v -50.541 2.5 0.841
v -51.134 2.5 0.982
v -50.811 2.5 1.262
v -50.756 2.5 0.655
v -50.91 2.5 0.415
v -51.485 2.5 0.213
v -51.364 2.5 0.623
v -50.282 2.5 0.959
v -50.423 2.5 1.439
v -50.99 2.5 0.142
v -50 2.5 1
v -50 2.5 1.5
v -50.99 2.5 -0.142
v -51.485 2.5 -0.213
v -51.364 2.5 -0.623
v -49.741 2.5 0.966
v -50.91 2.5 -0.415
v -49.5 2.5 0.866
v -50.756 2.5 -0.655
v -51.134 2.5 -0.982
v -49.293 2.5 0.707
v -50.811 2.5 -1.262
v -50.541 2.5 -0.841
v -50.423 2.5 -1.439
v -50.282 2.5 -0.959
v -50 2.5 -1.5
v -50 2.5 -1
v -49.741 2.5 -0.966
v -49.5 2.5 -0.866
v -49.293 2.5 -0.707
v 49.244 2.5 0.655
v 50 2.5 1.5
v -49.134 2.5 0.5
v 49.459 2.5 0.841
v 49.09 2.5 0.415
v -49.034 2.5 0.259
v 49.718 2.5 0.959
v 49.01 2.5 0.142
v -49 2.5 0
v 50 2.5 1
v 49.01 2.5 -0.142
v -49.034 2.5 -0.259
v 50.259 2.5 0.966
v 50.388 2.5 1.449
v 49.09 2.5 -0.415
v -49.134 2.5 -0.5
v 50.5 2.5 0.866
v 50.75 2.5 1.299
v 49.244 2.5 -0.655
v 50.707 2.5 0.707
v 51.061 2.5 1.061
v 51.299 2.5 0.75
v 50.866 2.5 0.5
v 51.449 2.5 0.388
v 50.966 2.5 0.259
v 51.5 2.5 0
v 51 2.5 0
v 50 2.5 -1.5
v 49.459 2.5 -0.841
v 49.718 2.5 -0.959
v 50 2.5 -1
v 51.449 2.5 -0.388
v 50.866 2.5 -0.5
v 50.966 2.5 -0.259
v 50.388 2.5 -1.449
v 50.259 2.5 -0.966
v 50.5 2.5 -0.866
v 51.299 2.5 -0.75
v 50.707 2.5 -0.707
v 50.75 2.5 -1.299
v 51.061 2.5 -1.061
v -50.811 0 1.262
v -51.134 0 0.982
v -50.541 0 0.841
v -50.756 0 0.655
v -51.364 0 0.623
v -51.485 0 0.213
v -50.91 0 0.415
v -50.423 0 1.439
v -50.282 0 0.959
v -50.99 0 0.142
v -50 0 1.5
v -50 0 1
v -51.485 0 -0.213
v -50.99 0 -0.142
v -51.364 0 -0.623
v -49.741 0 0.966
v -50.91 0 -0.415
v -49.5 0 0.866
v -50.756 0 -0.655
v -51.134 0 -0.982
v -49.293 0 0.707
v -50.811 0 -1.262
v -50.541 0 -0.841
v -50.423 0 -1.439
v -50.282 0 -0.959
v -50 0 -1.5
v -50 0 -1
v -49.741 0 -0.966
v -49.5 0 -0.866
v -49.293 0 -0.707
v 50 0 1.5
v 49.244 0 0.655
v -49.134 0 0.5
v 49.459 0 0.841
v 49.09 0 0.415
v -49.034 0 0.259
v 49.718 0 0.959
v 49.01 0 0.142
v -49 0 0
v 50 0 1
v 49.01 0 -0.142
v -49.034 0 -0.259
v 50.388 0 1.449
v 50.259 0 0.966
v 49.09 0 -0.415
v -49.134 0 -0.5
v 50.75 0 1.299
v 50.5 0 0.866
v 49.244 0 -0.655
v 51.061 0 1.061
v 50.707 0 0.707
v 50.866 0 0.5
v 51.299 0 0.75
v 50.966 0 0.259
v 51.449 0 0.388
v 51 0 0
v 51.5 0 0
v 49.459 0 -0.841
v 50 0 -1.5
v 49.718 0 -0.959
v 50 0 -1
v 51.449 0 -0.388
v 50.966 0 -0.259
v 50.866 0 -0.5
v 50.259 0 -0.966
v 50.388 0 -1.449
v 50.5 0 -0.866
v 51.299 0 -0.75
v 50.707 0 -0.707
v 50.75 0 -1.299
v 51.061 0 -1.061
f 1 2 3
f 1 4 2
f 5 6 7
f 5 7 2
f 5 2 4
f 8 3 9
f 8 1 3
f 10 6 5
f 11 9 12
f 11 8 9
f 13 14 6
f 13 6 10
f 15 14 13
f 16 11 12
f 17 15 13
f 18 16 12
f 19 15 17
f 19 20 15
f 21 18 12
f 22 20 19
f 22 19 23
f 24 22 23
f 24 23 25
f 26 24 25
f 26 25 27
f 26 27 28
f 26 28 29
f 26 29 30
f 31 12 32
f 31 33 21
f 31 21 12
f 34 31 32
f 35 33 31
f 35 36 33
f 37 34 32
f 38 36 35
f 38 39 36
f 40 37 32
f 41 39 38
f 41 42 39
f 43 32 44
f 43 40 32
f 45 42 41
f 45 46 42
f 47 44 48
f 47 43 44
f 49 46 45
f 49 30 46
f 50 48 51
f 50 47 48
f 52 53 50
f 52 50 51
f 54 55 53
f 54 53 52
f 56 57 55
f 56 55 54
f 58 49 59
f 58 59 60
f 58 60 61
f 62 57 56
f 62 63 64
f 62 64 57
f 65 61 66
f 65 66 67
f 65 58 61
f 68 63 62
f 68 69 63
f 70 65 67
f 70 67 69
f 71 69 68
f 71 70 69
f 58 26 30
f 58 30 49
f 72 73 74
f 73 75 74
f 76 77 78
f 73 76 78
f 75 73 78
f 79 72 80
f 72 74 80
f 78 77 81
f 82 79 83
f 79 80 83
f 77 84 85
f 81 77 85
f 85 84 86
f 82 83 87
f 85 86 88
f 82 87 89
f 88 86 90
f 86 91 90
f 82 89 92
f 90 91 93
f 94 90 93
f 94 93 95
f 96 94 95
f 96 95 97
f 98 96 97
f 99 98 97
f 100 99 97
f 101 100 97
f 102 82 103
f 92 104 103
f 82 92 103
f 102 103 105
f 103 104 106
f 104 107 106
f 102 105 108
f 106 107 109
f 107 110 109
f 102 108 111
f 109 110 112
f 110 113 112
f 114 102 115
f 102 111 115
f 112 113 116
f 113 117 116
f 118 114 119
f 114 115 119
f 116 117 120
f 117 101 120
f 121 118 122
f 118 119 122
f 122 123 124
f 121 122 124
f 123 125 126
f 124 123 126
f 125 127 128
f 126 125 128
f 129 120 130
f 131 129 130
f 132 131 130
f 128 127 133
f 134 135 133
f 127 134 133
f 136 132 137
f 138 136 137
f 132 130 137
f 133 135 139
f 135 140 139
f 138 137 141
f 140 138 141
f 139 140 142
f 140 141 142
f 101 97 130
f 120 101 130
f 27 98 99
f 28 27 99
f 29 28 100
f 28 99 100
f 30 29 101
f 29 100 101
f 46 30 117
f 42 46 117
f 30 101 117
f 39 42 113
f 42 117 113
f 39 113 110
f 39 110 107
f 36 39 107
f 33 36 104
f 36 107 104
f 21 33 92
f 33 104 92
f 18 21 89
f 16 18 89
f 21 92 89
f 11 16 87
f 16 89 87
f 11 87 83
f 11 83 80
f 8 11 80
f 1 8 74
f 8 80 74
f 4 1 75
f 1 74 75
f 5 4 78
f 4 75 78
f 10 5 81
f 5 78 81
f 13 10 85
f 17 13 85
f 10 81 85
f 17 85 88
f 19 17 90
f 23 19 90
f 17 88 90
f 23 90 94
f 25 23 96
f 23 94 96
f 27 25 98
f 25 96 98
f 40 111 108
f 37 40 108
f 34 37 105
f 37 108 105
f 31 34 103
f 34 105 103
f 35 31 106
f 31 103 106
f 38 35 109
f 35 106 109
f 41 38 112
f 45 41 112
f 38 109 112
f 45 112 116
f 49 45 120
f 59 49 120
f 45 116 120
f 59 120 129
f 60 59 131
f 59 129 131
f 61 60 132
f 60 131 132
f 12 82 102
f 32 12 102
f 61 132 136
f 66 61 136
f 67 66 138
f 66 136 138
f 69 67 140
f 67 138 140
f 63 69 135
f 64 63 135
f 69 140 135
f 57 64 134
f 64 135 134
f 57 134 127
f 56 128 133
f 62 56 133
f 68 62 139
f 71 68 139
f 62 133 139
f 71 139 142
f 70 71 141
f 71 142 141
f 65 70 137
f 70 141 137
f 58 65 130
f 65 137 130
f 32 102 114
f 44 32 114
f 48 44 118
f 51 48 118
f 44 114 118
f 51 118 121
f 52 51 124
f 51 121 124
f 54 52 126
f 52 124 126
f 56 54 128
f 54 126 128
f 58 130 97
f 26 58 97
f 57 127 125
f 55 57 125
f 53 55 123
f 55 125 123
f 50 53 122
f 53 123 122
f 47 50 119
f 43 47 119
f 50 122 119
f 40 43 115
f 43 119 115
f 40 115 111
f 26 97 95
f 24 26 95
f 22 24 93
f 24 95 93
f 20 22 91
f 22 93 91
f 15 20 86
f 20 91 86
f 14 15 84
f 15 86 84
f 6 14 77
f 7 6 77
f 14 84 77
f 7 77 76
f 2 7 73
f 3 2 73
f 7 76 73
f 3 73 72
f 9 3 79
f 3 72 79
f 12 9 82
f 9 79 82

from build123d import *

# Parameters (mm, degrees)
BOSS_EXTRUDE1_DEPTH = 2.5


with BuildPart() as part:
    # Sketch1 → Boss-Extrude1 (new body)
    with BuildSketch(Plane(origin=(0, 0, 0), x_dir=(1, 0, 0), z_dir=(0, 1, 0))):
        with BuildLine():
            ThreePointArc((-50, 1.5), (-51.5, 0), (-50, -1.5))
            Line((-50, -1.5), (-50, -1))
            ThreePointArc((-50, -1), (-51, 0), (-50, 1))
            Line((-50, 1), (-50, 1.5))
        make_face()
        with BuildLine():
            Line((-50, -1), (-50, -1.5))
            ThreePointArc((-50, -1.5), (-48.939339828, -1.060660172), (-48.5, 0))
            ThreePointArc((-48.5, 0), (-48.939339828, 1.060660172), (-50, 1.5))
            Line((-50, 1.5), (-50, 1))
            ThreePointArc((-50, 1), (-49.292893219, 0.707106781), (-49, 0))
            ThreePointArc((-49, 0), (-49.292893219, -0.707106781), (-50, -1))
        make_face()
        with BuildLine():
            ThreePointArc((-48.5, 0), (-48.939339828, -1.060660172), (-50, -1.5))
            Line((-50, -1.5), (50, -1.5))
            ThreePointArc((50, -1.5), (48.5, 0), (50, 1.5))
            Line((50, 1.5), (-50, 1.5))
            ThreePointArc((-50, 1.5), (-48.939339828, 1.060660172), (-48.5, 0))
        make_face()
        with BuildLine():
            ThreePointArc((50, 1.5), (48.5, 0), (50, -1.5))
            Line((50, -1.5), (50, -1))
            ThreePointArc((50, -1), (49, 0), (50, 1))
            Line((50, 1), (50, 1.5))
        make_face()
        with BuildLine():
            Line((50, -1), (50, -1.5))
            ThreePointArc((50, -1.5), (51.060660172, -1.060660172), (51.5, 0))
            ThreePointArc((51.5, 0), (51.060660172, 1.060660172), (50, 1.5))
            Line((50, 1.5), (50, 1))
            ThreePointArc((50, 1), (50.707106781, 0.707106781), (51, 0))
            ThreePointArc((51, 0), (50.707106781, -0.707106781), (50, -1))
        make_face()
    extrude(amount=BOSS_EXTRUDE1_DEPTH)


solid = part.part
